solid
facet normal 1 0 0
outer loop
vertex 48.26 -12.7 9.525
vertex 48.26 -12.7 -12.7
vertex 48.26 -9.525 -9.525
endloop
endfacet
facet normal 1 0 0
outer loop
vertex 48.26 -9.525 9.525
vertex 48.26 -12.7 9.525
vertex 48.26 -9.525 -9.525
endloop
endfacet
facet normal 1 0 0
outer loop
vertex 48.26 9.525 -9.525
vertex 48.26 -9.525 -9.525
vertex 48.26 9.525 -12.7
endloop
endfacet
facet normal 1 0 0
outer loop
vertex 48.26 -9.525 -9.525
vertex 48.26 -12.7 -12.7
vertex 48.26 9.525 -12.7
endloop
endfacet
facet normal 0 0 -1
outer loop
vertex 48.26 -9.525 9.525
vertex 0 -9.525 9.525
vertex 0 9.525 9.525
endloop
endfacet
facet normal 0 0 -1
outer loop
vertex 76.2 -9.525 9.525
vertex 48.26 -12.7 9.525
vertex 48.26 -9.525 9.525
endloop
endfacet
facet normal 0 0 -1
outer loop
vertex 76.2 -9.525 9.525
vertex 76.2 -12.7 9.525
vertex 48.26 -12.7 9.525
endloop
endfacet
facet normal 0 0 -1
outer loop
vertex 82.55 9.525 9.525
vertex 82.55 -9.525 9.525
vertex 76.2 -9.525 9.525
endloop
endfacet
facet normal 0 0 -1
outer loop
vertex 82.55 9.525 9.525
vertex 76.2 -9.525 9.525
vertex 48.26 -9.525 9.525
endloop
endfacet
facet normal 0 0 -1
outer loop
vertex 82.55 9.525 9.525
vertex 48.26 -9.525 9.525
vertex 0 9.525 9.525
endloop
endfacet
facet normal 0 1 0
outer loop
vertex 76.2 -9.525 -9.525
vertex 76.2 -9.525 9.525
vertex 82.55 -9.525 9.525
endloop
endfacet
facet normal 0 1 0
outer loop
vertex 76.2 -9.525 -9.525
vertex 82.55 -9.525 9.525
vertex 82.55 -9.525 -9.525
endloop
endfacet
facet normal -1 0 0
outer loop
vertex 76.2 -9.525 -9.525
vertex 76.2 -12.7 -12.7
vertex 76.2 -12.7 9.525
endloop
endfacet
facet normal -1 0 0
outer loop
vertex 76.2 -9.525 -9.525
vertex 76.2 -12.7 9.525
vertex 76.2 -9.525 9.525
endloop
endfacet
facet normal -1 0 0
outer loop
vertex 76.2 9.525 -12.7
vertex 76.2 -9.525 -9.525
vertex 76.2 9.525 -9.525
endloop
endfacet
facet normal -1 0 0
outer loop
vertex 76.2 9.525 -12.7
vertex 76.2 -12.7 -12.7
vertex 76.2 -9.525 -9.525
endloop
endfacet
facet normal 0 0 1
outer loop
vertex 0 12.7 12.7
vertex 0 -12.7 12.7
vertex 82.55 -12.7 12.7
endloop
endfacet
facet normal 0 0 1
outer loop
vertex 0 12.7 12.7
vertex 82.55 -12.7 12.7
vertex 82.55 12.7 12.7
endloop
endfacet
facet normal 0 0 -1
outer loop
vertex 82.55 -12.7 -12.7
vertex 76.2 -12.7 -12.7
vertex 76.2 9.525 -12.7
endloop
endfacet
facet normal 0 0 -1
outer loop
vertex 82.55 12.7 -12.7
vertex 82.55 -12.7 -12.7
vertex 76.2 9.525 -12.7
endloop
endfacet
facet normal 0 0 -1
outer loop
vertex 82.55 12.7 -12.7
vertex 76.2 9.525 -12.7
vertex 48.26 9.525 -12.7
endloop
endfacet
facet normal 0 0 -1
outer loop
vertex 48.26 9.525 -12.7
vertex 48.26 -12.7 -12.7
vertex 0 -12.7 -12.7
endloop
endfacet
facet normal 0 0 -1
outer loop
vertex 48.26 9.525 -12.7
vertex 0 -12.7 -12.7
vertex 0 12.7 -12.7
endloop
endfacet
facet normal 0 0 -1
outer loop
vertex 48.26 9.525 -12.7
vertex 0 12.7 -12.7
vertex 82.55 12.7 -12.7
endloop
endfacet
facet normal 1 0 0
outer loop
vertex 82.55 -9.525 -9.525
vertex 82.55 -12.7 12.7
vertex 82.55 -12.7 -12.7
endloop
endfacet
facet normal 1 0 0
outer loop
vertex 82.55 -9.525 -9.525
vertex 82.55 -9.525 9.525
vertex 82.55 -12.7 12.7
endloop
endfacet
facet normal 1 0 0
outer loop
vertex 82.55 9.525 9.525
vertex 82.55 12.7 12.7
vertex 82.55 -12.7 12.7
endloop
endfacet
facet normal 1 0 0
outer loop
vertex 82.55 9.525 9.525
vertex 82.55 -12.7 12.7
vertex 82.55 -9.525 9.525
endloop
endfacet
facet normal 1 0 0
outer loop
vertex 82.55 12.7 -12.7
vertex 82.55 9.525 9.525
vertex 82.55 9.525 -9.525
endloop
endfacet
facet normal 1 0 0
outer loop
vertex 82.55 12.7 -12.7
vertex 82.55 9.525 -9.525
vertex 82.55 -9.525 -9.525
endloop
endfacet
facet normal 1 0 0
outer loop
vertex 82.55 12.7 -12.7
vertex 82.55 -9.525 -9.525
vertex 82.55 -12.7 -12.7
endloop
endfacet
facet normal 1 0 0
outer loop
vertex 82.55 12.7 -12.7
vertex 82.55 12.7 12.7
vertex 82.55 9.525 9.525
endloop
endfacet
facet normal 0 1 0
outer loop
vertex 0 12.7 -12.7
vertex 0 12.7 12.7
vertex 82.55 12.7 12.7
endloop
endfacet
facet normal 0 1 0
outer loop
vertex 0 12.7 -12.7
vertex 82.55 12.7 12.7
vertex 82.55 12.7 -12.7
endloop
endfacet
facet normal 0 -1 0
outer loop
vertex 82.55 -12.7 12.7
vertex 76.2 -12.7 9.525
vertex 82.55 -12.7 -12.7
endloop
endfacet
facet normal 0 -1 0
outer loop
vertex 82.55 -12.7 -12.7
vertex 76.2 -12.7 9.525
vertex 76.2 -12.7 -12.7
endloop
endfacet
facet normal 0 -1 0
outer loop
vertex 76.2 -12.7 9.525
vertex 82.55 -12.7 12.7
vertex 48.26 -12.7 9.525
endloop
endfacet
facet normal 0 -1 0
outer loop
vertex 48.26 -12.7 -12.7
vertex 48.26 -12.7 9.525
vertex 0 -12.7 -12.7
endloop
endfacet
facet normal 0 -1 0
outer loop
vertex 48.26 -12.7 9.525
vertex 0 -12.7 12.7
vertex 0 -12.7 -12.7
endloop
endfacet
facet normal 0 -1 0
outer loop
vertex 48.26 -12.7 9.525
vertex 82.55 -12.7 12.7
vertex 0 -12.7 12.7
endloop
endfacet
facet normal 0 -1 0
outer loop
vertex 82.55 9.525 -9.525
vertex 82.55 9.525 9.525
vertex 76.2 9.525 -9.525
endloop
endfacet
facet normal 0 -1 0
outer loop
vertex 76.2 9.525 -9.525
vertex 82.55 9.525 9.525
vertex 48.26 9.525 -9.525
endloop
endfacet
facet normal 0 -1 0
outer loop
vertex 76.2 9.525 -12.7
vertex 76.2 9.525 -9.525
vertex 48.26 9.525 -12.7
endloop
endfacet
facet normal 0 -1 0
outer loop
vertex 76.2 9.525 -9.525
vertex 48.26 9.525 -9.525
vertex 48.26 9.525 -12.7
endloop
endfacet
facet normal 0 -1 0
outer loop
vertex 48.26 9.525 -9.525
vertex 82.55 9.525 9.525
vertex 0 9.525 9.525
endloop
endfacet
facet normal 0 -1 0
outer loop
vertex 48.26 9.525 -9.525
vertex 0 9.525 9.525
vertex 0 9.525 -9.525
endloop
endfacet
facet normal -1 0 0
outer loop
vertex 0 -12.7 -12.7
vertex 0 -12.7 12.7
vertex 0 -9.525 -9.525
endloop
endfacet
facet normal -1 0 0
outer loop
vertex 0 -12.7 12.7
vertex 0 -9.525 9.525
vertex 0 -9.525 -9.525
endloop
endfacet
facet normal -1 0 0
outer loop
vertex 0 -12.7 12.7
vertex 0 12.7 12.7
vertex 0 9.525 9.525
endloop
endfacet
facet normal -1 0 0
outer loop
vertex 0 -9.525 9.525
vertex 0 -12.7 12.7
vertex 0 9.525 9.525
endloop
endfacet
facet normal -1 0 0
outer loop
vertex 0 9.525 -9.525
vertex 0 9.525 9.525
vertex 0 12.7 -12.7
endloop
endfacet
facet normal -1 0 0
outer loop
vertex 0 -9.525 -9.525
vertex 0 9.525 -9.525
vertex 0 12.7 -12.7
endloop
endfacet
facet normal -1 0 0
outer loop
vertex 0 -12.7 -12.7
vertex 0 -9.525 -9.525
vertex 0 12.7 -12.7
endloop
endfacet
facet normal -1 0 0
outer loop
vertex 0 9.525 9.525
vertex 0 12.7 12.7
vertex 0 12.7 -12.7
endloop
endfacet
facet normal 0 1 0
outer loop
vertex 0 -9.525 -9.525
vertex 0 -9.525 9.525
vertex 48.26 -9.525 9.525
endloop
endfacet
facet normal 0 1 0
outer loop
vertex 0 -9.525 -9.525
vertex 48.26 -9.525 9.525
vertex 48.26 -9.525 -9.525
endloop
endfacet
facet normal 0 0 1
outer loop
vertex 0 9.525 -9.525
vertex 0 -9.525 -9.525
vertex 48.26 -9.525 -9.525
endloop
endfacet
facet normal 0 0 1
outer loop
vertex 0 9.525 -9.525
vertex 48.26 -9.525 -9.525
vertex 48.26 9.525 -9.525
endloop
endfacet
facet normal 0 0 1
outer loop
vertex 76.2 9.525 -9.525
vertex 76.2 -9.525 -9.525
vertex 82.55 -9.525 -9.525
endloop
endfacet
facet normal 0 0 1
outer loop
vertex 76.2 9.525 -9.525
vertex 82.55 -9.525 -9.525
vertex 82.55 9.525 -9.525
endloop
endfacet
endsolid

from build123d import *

# Parameters (mm, degrees)
SKETCH2_W           = 25.4
SKETCH2_H           = 25.4
SKETCH2_W_2         = 19.05
SKETCH2_H_2         = 19.05
BOSS_EXTRUDE1_DEPTH = 82.55
CUT_EXTRUDE1_REACH  = 89.298
SKETCH3_W           = 27.94
SKETCH3_H           = 22.225


with BuildPart() as part:
    # Sketch2 → Boss-Extrude1 (new body)
    with BuildSketch(Plane(origin=(0, 0, 0), x_dir=(0, 0, -1), z_dir=(1, 0, 0))):
        Rectangle(SKETCH2_W, SKETCH2_H)
        Rectangle(SKETCH2_W_2, SKETCH2_H_2, mode=Mode.SUBTRACT)
    extrude(amount=BOSS_EXTRUDE1_DEPTH)

    # Cut-Extrude1: up to this face of the body (flat: up to its plane)
    cut_extrude1_end = Plane(part.part.faces().sort_by_distance((41.275, 0, 9.525))[0])
    # Sketch3 → Cut-Extrude1 (cut, up to the picked face)
    with BuildSketch(Plane(origin=(0, 0, -12.7), x_dir=(-1, 0, 0), z_dir=(0, 0, -1)), mode=Mode.PRIVATE) as cut_extrude1_sk1:
        with Locations((-62.23, -1.5875)):
            Rectangle(SKETCH3_W, SKETCH3_H)
    cut_extrude1_tool1 = split(extrude(cut_extrude1_sk1.sketch, amount=-CUT_EXTRUDE1_REACH, mode=Mode.PRIVATE), bisect_by=cut_extrude1_end, keep=Keep.BOTH, mode=Mode.PRIVATE)
    add(cut_extrude1_tool1.solids().sort_by(Axis((62.23, -1.5875, -12.7), (0, 0, 1)))[0], mode=Mode.SUBTRACT)


solid = part.part
